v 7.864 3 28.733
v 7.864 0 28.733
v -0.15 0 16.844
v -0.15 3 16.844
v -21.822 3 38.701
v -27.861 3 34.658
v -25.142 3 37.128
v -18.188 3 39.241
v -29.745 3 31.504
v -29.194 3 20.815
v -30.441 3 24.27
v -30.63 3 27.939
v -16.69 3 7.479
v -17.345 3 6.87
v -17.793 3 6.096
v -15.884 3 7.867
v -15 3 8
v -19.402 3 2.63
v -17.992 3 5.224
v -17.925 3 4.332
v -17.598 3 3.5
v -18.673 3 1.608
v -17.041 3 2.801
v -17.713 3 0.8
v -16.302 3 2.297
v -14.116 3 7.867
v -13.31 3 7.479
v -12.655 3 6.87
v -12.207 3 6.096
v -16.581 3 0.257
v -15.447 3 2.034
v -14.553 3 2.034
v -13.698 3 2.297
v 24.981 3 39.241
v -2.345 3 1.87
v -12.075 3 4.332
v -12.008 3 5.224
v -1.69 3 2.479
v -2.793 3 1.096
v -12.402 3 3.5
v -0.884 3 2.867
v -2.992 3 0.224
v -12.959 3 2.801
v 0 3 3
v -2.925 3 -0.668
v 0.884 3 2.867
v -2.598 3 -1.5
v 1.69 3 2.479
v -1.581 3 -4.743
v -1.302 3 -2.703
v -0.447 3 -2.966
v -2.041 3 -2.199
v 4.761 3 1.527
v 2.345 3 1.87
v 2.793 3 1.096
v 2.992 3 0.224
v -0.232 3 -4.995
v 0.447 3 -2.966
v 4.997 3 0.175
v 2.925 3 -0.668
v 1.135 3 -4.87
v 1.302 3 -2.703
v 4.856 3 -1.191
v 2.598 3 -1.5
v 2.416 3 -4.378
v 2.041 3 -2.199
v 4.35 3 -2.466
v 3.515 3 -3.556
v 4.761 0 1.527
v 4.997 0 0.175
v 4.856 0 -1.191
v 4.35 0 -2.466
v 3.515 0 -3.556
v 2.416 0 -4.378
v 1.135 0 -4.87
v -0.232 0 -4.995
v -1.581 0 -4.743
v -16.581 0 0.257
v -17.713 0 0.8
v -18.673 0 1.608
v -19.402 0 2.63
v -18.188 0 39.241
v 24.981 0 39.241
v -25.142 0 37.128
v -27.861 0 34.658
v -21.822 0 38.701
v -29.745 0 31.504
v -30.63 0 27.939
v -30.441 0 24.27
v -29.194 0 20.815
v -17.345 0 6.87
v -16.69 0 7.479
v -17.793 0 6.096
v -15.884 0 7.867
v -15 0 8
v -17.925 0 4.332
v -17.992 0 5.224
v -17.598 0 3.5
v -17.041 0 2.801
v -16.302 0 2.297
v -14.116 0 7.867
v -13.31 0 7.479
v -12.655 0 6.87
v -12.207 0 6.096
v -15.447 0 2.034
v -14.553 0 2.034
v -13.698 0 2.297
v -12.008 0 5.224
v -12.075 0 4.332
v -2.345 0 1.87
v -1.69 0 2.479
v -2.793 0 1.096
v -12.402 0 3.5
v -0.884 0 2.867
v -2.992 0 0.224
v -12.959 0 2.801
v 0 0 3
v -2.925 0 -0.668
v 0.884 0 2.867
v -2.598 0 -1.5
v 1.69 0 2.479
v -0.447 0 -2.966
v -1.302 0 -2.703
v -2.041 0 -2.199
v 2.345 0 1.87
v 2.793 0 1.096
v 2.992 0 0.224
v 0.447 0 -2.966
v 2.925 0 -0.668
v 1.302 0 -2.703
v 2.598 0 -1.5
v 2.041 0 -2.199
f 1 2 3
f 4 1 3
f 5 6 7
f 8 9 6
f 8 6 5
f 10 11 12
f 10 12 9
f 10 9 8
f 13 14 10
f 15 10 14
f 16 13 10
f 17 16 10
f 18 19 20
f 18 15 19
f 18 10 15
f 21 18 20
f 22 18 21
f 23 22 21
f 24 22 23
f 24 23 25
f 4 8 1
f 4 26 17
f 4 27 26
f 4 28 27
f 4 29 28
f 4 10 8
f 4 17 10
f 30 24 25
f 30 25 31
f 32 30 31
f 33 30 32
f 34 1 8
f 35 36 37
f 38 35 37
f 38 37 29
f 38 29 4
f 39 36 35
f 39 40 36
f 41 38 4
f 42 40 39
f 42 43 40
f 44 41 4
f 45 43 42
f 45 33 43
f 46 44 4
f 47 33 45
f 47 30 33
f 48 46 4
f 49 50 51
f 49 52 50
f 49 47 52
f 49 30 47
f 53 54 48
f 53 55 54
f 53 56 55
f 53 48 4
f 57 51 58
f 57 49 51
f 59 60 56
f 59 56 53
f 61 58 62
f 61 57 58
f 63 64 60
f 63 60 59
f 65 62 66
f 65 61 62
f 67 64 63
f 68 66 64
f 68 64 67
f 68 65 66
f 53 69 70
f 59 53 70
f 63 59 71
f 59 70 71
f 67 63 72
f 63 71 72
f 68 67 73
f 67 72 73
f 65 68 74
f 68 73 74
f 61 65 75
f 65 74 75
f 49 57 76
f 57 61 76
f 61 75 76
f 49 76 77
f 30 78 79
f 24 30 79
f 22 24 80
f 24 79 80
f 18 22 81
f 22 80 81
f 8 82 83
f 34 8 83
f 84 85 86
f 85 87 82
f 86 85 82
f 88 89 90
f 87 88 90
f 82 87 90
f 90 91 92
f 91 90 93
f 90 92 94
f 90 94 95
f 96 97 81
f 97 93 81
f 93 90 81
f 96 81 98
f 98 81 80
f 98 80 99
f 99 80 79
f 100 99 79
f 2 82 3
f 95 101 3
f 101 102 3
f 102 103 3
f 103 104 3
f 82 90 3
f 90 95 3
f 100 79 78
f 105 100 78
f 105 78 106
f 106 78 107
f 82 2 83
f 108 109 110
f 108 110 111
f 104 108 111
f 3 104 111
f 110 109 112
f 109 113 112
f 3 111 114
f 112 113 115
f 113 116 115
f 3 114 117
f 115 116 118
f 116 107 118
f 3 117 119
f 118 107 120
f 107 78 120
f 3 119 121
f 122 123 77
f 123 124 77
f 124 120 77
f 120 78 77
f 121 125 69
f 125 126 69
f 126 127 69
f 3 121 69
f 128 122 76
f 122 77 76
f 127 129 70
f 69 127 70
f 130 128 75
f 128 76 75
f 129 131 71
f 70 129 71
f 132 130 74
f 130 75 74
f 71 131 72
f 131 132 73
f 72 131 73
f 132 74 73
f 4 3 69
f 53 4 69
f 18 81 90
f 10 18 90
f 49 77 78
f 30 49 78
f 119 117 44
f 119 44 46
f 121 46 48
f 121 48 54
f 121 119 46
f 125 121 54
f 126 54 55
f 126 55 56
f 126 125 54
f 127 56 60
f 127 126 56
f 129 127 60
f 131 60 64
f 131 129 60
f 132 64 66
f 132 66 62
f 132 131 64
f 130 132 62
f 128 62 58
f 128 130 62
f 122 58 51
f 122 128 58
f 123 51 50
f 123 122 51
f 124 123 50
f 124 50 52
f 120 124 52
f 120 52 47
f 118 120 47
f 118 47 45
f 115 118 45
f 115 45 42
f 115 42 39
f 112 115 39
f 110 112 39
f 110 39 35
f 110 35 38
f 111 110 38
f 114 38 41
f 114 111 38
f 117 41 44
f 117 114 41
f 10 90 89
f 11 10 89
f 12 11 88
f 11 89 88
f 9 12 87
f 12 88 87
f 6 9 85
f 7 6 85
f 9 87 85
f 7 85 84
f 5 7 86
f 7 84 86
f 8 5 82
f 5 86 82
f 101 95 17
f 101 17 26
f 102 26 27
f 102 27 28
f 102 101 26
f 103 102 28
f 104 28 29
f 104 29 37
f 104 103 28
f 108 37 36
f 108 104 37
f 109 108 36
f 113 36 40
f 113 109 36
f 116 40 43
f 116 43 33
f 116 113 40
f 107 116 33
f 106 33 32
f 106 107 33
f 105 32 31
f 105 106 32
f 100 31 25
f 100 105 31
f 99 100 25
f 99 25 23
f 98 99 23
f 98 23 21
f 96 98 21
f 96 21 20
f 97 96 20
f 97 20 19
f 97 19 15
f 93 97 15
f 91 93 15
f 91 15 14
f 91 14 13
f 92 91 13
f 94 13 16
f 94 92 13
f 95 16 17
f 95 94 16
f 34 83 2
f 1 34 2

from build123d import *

# Parameters (mm, degrees)
SKETCH_2_R      = 12.5
SKETCH_2_R_2    = 5
SKETCH_2_R_3    = 3
EXTRUDE_1_DEPTH = 3


with BuildPart() as part:
    # 草图2 → 凸台-拉伸1 (new body)
    # profile 1 of 4: a face of its own
    with BuildSketch(Plane(origin=(0, 0, 0), x_dir=(1, 0, 0), z_dir=(0, 1, 0))):
        with BuildLine():
            Line((7.863659035, -28.733376736), (-0.149942941, -16.843591901))
            Line((-0.149942941, -16.843591901), (4.761239815, -1.526628777))
            ThreePointArc((4.761239815, -1.526628777), (-3.515199494, -3.555752033), (-1.58113883, 4.74341649))
            Line((-1.58113883, 4.74341649), (-16.58113883, -0.25658351))
            ThreePointArc((-16.58113883, -0.25658351), (-12.076448577, -0.943789074), (-10, -5))
            ThreePointArc((-10, -5), (-16.222270381, -9.848304355), (-19.402422046, -2.629624476))
            Line((-19.402422046, -2.629624476), (-29.193931666, -20.815079176))
            ThreePointArc((-29.193931666, -20.815079176), (-15.132200589, -14.620257894), (-5.687876925, -26.741018684))
            ThreePointArc((-5.687876925, -26.741018684), (-9.34904216, -35.579853449), (-18.187876925, -39.241018684))
            Line((-18.187876925, -39.241018684), (24.980566617, -39.241018684))
            Line((24.980566617, -39.241018684), (7.863659035, -28.733376736))
        make_face()
    # profile 2 of 4: a face of its own
    with BuildSketch(Plane(origin=(0, 0, 0), x_dir=(1, 0, 0), z_dir=(0, 1, 0))):
        with Locations((-18.187876925, -26.741018684)):
            Circle(SKETCH_2_R)
    # profile 3 of 4: a face of its own
    with BuildSketch(Plane(origin=(0, 0, 0), x_dir=(1, 0, 0), z_dir=(0, 1, 0))):
        with Locations((-15, -5)):
            Circle(SKETCH_2_R_2)
        with Locations(Location((-15, -5, 0), (0, 0, 270))):
            Circle(SKETCH_2_R_3, mode=Mode.SUBTRACT)
    # profile 4 of 4: a face of its own
    with BuildSketch(Plane(origin=(0, 0, 0), x_dir=(1, 0, 0), z_dir=(0, 1, 0))):
        Circle(SKETCH_2_R_2)
        with Locations(Location((0, 0, 0), (0, 0, 270))):
            Circle(SKETCH_2_R_3, mode=Mode.SUBTRACT)
    extrude(amount=EXTRUDE_1_DEPTH)


solid = part.part
